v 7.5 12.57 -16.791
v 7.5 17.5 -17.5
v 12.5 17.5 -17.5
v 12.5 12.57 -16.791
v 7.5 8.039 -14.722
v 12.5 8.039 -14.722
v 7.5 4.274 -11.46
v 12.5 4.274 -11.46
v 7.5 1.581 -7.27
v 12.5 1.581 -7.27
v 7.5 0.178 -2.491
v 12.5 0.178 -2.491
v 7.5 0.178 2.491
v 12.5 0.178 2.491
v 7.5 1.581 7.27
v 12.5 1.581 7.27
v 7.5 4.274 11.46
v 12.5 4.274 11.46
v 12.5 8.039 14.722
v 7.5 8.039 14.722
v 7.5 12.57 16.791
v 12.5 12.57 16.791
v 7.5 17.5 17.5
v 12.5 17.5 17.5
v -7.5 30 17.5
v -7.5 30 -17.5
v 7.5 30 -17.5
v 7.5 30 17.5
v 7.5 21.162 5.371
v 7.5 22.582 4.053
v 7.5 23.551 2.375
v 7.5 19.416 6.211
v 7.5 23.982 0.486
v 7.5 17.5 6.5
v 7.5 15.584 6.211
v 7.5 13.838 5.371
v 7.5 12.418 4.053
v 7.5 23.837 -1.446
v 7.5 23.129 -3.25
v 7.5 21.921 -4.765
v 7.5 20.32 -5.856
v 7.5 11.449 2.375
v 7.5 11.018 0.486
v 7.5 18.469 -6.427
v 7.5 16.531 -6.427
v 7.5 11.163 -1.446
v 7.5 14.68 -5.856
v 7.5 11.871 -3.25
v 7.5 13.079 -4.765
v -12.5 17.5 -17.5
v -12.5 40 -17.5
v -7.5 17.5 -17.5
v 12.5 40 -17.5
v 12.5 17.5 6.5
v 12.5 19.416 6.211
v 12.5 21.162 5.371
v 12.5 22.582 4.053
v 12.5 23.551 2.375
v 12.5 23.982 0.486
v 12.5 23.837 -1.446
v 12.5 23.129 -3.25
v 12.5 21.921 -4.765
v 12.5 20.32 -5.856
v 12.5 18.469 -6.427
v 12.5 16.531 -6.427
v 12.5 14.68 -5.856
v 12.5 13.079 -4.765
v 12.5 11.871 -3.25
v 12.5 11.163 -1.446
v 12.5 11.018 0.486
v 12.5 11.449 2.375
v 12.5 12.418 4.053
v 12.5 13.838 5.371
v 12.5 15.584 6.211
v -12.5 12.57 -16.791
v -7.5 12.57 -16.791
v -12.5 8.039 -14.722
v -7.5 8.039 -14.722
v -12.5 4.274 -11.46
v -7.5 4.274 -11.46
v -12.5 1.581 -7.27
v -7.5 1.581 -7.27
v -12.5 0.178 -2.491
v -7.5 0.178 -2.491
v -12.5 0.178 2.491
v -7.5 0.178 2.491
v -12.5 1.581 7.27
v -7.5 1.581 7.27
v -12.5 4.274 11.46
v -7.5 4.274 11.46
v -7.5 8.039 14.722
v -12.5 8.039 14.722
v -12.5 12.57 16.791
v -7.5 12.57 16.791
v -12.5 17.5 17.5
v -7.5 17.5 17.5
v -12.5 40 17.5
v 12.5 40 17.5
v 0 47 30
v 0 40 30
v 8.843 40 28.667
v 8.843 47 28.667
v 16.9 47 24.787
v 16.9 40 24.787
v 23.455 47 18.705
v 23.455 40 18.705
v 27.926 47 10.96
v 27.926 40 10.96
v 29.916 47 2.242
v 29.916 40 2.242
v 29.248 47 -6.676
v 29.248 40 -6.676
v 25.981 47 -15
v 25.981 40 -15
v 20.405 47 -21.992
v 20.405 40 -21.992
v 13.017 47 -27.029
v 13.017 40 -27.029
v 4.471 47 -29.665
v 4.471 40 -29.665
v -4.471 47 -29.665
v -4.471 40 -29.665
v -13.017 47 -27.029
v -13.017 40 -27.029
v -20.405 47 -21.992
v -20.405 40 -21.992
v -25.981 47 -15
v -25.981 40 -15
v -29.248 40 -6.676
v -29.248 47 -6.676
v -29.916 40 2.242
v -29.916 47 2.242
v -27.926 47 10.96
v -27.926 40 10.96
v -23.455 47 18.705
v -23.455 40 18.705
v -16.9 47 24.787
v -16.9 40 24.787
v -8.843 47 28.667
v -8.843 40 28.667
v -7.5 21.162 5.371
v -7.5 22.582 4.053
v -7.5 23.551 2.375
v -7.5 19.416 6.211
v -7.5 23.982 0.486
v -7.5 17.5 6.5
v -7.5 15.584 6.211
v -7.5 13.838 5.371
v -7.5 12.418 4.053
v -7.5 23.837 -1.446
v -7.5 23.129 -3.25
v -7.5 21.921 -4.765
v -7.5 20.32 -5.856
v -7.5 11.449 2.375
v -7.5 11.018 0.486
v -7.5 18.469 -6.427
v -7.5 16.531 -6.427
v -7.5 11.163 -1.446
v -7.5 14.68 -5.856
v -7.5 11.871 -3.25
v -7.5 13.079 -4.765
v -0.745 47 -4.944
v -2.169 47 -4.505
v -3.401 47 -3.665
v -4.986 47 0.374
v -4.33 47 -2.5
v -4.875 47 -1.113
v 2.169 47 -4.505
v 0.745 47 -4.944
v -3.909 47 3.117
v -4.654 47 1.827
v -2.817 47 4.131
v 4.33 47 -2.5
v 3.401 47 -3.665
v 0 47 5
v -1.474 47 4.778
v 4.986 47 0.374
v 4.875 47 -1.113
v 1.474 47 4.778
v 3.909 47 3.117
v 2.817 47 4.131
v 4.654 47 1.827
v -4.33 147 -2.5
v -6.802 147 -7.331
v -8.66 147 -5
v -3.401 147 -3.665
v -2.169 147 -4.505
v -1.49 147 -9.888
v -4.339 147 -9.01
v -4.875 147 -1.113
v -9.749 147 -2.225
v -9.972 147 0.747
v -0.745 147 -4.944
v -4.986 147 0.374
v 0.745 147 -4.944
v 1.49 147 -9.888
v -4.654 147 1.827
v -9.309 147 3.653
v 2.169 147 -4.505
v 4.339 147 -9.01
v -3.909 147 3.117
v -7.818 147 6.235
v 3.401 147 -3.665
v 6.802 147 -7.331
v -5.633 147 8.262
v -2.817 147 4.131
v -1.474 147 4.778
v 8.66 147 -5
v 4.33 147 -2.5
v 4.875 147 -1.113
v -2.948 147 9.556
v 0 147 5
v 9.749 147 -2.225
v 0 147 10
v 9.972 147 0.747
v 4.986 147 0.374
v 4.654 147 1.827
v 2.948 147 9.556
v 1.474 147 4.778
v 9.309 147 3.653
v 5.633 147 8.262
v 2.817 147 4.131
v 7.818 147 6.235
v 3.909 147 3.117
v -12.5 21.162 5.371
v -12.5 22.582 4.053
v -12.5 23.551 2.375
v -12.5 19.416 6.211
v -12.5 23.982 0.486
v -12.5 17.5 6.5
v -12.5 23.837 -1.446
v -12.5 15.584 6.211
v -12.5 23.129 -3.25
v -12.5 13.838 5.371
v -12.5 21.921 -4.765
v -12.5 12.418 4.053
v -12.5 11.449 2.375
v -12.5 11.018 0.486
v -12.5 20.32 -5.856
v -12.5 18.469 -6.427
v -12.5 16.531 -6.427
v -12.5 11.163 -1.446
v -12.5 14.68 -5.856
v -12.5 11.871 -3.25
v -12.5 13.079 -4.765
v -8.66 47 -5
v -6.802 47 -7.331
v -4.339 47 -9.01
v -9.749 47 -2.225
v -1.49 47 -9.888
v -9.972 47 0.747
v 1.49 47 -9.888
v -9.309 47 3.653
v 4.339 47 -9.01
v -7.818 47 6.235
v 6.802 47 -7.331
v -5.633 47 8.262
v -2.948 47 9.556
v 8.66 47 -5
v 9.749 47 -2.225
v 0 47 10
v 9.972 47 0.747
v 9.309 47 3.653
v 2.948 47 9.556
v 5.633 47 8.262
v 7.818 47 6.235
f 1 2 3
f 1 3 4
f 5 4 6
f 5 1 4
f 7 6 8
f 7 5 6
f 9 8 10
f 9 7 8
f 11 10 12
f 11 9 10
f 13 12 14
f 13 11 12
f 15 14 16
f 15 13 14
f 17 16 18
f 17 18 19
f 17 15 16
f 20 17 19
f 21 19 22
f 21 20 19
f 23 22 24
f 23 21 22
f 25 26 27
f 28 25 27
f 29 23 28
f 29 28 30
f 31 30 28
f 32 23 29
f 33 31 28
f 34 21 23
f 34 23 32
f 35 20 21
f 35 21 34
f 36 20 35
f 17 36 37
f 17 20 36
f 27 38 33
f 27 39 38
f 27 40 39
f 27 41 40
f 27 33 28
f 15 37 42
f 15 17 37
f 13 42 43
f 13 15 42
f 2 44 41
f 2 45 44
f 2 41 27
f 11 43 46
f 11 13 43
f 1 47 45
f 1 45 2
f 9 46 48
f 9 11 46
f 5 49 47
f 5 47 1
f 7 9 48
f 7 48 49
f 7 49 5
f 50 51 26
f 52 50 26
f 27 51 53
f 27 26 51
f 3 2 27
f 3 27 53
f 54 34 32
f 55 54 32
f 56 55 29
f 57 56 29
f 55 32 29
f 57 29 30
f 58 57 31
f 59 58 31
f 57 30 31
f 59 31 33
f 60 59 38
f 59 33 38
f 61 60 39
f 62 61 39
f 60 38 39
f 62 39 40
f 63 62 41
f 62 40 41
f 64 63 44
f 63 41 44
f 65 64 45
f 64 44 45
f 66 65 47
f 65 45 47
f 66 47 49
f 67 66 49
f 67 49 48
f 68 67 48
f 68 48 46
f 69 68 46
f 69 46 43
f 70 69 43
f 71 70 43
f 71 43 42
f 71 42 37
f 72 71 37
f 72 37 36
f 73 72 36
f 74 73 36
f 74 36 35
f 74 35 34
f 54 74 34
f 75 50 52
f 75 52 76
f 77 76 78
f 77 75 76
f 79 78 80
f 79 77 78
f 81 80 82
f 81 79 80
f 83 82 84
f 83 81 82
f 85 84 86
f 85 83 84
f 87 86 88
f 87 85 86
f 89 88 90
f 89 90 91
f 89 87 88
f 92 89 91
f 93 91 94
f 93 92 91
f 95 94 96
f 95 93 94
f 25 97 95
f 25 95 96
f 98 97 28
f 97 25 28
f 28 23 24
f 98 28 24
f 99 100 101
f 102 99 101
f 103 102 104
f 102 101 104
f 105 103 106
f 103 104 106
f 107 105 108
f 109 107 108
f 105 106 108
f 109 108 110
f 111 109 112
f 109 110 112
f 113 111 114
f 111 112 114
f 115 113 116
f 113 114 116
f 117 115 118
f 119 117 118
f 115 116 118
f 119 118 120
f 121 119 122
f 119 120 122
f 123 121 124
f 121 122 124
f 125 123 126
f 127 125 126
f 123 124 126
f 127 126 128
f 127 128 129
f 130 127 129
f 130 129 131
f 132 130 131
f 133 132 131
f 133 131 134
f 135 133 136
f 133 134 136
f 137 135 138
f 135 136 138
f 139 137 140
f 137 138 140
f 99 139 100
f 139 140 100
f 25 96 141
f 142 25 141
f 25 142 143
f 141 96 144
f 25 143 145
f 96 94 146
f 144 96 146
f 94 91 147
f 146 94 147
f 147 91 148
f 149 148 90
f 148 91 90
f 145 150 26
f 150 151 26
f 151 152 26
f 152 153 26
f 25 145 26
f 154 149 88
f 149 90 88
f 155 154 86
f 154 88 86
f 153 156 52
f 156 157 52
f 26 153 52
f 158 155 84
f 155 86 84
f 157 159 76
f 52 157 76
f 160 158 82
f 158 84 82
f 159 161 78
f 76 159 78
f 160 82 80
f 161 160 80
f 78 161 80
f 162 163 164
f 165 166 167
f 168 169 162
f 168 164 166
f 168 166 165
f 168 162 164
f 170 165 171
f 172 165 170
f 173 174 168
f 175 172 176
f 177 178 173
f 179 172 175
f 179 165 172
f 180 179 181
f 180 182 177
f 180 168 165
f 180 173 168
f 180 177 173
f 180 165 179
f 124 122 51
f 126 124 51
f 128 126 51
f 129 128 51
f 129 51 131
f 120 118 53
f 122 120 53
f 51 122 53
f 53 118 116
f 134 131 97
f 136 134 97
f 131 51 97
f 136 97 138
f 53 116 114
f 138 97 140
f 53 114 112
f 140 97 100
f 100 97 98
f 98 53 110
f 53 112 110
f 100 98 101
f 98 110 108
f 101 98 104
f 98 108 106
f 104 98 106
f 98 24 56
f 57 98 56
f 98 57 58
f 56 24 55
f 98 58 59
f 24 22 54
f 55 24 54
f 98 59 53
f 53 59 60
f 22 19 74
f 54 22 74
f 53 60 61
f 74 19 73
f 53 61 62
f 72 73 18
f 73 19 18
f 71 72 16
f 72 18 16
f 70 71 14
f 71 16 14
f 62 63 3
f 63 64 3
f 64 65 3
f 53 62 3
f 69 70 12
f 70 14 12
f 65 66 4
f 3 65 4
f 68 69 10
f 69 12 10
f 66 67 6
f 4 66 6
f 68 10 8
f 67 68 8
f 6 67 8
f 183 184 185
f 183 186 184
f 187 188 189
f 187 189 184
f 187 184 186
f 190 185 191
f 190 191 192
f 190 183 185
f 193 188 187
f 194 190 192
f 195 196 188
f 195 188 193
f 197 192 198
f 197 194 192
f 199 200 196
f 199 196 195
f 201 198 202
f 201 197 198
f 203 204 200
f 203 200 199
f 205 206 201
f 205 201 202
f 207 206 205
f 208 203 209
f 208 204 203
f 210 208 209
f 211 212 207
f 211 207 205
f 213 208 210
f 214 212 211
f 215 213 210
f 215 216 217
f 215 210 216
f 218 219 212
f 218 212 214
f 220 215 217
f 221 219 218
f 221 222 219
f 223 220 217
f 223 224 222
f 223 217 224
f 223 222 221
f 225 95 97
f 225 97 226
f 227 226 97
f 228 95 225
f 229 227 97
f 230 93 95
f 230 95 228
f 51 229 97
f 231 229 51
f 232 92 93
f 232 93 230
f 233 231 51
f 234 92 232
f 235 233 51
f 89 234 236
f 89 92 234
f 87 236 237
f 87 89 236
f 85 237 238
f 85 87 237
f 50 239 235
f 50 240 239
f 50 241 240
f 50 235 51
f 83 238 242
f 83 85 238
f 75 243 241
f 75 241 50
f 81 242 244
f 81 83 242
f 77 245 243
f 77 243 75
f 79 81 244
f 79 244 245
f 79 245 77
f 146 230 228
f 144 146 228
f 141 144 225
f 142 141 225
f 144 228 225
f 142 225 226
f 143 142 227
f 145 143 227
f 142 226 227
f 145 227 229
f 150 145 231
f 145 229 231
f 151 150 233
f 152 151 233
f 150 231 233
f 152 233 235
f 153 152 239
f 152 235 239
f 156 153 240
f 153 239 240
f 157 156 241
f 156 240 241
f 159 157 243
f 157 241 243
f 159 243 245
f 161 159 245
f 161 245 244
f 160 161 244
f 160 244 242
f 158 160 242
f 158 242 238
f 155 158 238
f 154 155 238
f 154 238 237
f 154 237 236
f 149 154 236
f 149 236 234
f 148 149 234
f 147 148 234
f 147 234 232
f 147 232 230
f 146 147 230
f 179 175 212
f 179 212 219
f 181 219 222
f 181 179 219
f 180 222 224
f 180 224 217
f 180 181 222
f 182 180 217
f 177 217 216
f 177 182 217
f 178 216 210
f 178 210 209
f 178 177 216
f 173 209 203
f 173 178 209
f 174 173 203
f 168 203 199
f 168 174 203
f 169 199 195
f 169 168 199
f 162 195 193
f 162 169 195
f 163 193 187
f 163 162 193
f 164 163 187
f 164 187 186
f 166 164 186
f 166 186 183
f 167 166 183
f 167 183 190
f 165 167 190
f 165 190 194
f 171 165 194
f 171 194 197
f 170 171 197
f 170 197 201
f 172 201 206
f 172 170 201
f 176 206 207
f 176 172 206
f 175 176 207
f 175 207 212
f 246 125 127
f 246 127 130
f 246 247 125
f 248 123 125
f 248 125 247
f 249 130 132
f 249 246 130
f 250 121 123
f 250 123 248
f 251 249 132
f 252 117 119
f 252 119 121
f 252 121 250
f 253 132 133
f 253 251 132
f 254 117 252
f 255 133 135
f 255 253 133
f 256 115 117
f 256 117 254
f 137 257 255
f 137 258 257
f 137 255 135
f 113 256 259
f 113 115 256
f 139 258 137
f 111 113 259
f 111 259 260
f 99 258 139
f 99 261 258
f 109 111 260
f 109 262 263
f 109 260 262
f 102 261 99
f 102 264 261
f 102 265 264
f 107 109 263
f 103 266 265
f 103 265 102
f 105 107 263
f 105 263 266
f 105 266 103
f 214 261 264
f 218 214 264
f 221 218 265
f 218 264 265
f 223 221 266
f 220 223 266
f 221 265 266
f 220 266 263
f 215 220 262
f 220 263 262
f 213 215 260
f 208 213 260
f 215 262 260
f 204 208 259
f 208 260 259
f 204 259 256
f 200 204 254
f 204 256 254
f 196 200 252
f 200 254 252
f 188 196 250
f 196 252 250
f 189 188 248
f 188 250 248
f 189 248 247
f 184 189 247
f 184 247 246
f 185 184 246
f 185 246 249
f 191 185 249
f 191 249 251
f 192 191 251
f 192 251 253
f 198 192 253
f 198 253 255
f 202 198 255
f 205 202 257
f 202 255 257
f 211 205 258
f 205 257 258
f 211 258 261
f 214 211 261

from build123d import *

# Parameters (mm, degrees)
SKETCH1_W           = 25
SKETCH1_H           = 35
BOSS_EXTRUDE1_DEPTH = 40
FILLET1_RADIUS      = 17.5
FILLET1_LENGTH      = 25
SKETCH2_W           = 15
SKETCH2_H           = 35
CUT_EXTRUDE1_DEPTH  = 30
SKETCH3_R           = 6.5
CUT_EXTRUDE2_DEPTH  = 30
SKETCH5_R           = 30
BOSS_EXTRUDE2_DEPTH = 7
SKETCH6_R           = 10
SKETCH6_R_2         = 5
BOSS_EXTRUDE3_DEPTH = 100


with BuildPart() as part:
    # Sketch1 → Boss-Extrude1 (new body)
    with BuildSketch(Plane(origin=(0, 0, 0), x_dir=(1, 0, 0), z_dir=(0, 1, 0))):
        Rectangle(SKETCH1_W, SKETCH1_H)
    extrude(amount=BOSS_EXTRUDE1_DEPTH)

    # Fillet1: full round fillet: the end face becomes a half cylinder, R = half its width
    fillet1_face = Plane((0, 0, 0), x_dir=(-1, 0, 0), z_dir=(0, -1, 0))  # on the end face: x along it, z out of the body
    fillet1_slab = fillet1_face.offset(-FILLET1_RADIUS / 2) * Box(FILLET1_LENGTH, 2 * FILLET1_RADIUS, FILLET1_RADIUS, mode=Mode.PRIVATE)  # the body's end, R deep
    fillet1_round = Plane((0, 17.5, 0), x_dir=(0, -1, 0), z_dir=(-1, 0, 0)) * Cylinder(FILLET1_RADIUS, FILLET1_LENGTH, mode=Mode.PRIVATE)  # its axis R under the face
    add(fillet1_slab - fillet1_round, mode=Mode.SUBTRACT)

    # Sketch2 → Cut-Extrude1 (cut)
    with BuildSketch(Plane(origin=(0, 0, 0), x_dir=(1, 0, 0), z_dir=(0, 1, 0))):
        Rectangle(SKETCH2_W, SKETCH2_H)
    extrude(amount=CUT_EXTRUDE1_DEPTH, mode=Mode.SUBTRACT)

    # Sketch3 → Cut-Extrude2 (cut)
    with BuildSketch(Plane.ZY.offset(12.5)):
        with Locations((0, 17.5)):
            Circle(SKETCH3_R)
    extrude(amount=-CUT_EXTRUDE2_DEPTH, mode=Mode.SUBTRACT)

    # Sketch5 → Boss-Extrude2 (add)
    with BuildSketch(Plane(origin=(0, 40, 0), x_dir=(1, 0, 0), z_dir=(0, 1, 0))):
        with Locations(Location((0, 0, 0), (0, 0, 270))):
            Circle(SKETCH5_R)
    extrude(amount=BOSS_EXTRUDE2_DEPTH)

    # Sketch6 → Boss-Extrude3 (add)
    with BuildSketch(Plane(origin=(0, 47, 0), x_dir=(1, 0, 0), z_dir=(0, 1, 0))):
        with Locations(Location((0, 0, 0), (0, 0, 270))):
            Circle(SKETCH6_R)
        with Locations(Location((0, 0, 0), (0, 0, 270))):
            Circle(SKETCH6_R_2, mode=Mode.SUBTRACT)
    extrude(amount=BOSS_EXTRUDE3_DEPTH)


solid = part.part
